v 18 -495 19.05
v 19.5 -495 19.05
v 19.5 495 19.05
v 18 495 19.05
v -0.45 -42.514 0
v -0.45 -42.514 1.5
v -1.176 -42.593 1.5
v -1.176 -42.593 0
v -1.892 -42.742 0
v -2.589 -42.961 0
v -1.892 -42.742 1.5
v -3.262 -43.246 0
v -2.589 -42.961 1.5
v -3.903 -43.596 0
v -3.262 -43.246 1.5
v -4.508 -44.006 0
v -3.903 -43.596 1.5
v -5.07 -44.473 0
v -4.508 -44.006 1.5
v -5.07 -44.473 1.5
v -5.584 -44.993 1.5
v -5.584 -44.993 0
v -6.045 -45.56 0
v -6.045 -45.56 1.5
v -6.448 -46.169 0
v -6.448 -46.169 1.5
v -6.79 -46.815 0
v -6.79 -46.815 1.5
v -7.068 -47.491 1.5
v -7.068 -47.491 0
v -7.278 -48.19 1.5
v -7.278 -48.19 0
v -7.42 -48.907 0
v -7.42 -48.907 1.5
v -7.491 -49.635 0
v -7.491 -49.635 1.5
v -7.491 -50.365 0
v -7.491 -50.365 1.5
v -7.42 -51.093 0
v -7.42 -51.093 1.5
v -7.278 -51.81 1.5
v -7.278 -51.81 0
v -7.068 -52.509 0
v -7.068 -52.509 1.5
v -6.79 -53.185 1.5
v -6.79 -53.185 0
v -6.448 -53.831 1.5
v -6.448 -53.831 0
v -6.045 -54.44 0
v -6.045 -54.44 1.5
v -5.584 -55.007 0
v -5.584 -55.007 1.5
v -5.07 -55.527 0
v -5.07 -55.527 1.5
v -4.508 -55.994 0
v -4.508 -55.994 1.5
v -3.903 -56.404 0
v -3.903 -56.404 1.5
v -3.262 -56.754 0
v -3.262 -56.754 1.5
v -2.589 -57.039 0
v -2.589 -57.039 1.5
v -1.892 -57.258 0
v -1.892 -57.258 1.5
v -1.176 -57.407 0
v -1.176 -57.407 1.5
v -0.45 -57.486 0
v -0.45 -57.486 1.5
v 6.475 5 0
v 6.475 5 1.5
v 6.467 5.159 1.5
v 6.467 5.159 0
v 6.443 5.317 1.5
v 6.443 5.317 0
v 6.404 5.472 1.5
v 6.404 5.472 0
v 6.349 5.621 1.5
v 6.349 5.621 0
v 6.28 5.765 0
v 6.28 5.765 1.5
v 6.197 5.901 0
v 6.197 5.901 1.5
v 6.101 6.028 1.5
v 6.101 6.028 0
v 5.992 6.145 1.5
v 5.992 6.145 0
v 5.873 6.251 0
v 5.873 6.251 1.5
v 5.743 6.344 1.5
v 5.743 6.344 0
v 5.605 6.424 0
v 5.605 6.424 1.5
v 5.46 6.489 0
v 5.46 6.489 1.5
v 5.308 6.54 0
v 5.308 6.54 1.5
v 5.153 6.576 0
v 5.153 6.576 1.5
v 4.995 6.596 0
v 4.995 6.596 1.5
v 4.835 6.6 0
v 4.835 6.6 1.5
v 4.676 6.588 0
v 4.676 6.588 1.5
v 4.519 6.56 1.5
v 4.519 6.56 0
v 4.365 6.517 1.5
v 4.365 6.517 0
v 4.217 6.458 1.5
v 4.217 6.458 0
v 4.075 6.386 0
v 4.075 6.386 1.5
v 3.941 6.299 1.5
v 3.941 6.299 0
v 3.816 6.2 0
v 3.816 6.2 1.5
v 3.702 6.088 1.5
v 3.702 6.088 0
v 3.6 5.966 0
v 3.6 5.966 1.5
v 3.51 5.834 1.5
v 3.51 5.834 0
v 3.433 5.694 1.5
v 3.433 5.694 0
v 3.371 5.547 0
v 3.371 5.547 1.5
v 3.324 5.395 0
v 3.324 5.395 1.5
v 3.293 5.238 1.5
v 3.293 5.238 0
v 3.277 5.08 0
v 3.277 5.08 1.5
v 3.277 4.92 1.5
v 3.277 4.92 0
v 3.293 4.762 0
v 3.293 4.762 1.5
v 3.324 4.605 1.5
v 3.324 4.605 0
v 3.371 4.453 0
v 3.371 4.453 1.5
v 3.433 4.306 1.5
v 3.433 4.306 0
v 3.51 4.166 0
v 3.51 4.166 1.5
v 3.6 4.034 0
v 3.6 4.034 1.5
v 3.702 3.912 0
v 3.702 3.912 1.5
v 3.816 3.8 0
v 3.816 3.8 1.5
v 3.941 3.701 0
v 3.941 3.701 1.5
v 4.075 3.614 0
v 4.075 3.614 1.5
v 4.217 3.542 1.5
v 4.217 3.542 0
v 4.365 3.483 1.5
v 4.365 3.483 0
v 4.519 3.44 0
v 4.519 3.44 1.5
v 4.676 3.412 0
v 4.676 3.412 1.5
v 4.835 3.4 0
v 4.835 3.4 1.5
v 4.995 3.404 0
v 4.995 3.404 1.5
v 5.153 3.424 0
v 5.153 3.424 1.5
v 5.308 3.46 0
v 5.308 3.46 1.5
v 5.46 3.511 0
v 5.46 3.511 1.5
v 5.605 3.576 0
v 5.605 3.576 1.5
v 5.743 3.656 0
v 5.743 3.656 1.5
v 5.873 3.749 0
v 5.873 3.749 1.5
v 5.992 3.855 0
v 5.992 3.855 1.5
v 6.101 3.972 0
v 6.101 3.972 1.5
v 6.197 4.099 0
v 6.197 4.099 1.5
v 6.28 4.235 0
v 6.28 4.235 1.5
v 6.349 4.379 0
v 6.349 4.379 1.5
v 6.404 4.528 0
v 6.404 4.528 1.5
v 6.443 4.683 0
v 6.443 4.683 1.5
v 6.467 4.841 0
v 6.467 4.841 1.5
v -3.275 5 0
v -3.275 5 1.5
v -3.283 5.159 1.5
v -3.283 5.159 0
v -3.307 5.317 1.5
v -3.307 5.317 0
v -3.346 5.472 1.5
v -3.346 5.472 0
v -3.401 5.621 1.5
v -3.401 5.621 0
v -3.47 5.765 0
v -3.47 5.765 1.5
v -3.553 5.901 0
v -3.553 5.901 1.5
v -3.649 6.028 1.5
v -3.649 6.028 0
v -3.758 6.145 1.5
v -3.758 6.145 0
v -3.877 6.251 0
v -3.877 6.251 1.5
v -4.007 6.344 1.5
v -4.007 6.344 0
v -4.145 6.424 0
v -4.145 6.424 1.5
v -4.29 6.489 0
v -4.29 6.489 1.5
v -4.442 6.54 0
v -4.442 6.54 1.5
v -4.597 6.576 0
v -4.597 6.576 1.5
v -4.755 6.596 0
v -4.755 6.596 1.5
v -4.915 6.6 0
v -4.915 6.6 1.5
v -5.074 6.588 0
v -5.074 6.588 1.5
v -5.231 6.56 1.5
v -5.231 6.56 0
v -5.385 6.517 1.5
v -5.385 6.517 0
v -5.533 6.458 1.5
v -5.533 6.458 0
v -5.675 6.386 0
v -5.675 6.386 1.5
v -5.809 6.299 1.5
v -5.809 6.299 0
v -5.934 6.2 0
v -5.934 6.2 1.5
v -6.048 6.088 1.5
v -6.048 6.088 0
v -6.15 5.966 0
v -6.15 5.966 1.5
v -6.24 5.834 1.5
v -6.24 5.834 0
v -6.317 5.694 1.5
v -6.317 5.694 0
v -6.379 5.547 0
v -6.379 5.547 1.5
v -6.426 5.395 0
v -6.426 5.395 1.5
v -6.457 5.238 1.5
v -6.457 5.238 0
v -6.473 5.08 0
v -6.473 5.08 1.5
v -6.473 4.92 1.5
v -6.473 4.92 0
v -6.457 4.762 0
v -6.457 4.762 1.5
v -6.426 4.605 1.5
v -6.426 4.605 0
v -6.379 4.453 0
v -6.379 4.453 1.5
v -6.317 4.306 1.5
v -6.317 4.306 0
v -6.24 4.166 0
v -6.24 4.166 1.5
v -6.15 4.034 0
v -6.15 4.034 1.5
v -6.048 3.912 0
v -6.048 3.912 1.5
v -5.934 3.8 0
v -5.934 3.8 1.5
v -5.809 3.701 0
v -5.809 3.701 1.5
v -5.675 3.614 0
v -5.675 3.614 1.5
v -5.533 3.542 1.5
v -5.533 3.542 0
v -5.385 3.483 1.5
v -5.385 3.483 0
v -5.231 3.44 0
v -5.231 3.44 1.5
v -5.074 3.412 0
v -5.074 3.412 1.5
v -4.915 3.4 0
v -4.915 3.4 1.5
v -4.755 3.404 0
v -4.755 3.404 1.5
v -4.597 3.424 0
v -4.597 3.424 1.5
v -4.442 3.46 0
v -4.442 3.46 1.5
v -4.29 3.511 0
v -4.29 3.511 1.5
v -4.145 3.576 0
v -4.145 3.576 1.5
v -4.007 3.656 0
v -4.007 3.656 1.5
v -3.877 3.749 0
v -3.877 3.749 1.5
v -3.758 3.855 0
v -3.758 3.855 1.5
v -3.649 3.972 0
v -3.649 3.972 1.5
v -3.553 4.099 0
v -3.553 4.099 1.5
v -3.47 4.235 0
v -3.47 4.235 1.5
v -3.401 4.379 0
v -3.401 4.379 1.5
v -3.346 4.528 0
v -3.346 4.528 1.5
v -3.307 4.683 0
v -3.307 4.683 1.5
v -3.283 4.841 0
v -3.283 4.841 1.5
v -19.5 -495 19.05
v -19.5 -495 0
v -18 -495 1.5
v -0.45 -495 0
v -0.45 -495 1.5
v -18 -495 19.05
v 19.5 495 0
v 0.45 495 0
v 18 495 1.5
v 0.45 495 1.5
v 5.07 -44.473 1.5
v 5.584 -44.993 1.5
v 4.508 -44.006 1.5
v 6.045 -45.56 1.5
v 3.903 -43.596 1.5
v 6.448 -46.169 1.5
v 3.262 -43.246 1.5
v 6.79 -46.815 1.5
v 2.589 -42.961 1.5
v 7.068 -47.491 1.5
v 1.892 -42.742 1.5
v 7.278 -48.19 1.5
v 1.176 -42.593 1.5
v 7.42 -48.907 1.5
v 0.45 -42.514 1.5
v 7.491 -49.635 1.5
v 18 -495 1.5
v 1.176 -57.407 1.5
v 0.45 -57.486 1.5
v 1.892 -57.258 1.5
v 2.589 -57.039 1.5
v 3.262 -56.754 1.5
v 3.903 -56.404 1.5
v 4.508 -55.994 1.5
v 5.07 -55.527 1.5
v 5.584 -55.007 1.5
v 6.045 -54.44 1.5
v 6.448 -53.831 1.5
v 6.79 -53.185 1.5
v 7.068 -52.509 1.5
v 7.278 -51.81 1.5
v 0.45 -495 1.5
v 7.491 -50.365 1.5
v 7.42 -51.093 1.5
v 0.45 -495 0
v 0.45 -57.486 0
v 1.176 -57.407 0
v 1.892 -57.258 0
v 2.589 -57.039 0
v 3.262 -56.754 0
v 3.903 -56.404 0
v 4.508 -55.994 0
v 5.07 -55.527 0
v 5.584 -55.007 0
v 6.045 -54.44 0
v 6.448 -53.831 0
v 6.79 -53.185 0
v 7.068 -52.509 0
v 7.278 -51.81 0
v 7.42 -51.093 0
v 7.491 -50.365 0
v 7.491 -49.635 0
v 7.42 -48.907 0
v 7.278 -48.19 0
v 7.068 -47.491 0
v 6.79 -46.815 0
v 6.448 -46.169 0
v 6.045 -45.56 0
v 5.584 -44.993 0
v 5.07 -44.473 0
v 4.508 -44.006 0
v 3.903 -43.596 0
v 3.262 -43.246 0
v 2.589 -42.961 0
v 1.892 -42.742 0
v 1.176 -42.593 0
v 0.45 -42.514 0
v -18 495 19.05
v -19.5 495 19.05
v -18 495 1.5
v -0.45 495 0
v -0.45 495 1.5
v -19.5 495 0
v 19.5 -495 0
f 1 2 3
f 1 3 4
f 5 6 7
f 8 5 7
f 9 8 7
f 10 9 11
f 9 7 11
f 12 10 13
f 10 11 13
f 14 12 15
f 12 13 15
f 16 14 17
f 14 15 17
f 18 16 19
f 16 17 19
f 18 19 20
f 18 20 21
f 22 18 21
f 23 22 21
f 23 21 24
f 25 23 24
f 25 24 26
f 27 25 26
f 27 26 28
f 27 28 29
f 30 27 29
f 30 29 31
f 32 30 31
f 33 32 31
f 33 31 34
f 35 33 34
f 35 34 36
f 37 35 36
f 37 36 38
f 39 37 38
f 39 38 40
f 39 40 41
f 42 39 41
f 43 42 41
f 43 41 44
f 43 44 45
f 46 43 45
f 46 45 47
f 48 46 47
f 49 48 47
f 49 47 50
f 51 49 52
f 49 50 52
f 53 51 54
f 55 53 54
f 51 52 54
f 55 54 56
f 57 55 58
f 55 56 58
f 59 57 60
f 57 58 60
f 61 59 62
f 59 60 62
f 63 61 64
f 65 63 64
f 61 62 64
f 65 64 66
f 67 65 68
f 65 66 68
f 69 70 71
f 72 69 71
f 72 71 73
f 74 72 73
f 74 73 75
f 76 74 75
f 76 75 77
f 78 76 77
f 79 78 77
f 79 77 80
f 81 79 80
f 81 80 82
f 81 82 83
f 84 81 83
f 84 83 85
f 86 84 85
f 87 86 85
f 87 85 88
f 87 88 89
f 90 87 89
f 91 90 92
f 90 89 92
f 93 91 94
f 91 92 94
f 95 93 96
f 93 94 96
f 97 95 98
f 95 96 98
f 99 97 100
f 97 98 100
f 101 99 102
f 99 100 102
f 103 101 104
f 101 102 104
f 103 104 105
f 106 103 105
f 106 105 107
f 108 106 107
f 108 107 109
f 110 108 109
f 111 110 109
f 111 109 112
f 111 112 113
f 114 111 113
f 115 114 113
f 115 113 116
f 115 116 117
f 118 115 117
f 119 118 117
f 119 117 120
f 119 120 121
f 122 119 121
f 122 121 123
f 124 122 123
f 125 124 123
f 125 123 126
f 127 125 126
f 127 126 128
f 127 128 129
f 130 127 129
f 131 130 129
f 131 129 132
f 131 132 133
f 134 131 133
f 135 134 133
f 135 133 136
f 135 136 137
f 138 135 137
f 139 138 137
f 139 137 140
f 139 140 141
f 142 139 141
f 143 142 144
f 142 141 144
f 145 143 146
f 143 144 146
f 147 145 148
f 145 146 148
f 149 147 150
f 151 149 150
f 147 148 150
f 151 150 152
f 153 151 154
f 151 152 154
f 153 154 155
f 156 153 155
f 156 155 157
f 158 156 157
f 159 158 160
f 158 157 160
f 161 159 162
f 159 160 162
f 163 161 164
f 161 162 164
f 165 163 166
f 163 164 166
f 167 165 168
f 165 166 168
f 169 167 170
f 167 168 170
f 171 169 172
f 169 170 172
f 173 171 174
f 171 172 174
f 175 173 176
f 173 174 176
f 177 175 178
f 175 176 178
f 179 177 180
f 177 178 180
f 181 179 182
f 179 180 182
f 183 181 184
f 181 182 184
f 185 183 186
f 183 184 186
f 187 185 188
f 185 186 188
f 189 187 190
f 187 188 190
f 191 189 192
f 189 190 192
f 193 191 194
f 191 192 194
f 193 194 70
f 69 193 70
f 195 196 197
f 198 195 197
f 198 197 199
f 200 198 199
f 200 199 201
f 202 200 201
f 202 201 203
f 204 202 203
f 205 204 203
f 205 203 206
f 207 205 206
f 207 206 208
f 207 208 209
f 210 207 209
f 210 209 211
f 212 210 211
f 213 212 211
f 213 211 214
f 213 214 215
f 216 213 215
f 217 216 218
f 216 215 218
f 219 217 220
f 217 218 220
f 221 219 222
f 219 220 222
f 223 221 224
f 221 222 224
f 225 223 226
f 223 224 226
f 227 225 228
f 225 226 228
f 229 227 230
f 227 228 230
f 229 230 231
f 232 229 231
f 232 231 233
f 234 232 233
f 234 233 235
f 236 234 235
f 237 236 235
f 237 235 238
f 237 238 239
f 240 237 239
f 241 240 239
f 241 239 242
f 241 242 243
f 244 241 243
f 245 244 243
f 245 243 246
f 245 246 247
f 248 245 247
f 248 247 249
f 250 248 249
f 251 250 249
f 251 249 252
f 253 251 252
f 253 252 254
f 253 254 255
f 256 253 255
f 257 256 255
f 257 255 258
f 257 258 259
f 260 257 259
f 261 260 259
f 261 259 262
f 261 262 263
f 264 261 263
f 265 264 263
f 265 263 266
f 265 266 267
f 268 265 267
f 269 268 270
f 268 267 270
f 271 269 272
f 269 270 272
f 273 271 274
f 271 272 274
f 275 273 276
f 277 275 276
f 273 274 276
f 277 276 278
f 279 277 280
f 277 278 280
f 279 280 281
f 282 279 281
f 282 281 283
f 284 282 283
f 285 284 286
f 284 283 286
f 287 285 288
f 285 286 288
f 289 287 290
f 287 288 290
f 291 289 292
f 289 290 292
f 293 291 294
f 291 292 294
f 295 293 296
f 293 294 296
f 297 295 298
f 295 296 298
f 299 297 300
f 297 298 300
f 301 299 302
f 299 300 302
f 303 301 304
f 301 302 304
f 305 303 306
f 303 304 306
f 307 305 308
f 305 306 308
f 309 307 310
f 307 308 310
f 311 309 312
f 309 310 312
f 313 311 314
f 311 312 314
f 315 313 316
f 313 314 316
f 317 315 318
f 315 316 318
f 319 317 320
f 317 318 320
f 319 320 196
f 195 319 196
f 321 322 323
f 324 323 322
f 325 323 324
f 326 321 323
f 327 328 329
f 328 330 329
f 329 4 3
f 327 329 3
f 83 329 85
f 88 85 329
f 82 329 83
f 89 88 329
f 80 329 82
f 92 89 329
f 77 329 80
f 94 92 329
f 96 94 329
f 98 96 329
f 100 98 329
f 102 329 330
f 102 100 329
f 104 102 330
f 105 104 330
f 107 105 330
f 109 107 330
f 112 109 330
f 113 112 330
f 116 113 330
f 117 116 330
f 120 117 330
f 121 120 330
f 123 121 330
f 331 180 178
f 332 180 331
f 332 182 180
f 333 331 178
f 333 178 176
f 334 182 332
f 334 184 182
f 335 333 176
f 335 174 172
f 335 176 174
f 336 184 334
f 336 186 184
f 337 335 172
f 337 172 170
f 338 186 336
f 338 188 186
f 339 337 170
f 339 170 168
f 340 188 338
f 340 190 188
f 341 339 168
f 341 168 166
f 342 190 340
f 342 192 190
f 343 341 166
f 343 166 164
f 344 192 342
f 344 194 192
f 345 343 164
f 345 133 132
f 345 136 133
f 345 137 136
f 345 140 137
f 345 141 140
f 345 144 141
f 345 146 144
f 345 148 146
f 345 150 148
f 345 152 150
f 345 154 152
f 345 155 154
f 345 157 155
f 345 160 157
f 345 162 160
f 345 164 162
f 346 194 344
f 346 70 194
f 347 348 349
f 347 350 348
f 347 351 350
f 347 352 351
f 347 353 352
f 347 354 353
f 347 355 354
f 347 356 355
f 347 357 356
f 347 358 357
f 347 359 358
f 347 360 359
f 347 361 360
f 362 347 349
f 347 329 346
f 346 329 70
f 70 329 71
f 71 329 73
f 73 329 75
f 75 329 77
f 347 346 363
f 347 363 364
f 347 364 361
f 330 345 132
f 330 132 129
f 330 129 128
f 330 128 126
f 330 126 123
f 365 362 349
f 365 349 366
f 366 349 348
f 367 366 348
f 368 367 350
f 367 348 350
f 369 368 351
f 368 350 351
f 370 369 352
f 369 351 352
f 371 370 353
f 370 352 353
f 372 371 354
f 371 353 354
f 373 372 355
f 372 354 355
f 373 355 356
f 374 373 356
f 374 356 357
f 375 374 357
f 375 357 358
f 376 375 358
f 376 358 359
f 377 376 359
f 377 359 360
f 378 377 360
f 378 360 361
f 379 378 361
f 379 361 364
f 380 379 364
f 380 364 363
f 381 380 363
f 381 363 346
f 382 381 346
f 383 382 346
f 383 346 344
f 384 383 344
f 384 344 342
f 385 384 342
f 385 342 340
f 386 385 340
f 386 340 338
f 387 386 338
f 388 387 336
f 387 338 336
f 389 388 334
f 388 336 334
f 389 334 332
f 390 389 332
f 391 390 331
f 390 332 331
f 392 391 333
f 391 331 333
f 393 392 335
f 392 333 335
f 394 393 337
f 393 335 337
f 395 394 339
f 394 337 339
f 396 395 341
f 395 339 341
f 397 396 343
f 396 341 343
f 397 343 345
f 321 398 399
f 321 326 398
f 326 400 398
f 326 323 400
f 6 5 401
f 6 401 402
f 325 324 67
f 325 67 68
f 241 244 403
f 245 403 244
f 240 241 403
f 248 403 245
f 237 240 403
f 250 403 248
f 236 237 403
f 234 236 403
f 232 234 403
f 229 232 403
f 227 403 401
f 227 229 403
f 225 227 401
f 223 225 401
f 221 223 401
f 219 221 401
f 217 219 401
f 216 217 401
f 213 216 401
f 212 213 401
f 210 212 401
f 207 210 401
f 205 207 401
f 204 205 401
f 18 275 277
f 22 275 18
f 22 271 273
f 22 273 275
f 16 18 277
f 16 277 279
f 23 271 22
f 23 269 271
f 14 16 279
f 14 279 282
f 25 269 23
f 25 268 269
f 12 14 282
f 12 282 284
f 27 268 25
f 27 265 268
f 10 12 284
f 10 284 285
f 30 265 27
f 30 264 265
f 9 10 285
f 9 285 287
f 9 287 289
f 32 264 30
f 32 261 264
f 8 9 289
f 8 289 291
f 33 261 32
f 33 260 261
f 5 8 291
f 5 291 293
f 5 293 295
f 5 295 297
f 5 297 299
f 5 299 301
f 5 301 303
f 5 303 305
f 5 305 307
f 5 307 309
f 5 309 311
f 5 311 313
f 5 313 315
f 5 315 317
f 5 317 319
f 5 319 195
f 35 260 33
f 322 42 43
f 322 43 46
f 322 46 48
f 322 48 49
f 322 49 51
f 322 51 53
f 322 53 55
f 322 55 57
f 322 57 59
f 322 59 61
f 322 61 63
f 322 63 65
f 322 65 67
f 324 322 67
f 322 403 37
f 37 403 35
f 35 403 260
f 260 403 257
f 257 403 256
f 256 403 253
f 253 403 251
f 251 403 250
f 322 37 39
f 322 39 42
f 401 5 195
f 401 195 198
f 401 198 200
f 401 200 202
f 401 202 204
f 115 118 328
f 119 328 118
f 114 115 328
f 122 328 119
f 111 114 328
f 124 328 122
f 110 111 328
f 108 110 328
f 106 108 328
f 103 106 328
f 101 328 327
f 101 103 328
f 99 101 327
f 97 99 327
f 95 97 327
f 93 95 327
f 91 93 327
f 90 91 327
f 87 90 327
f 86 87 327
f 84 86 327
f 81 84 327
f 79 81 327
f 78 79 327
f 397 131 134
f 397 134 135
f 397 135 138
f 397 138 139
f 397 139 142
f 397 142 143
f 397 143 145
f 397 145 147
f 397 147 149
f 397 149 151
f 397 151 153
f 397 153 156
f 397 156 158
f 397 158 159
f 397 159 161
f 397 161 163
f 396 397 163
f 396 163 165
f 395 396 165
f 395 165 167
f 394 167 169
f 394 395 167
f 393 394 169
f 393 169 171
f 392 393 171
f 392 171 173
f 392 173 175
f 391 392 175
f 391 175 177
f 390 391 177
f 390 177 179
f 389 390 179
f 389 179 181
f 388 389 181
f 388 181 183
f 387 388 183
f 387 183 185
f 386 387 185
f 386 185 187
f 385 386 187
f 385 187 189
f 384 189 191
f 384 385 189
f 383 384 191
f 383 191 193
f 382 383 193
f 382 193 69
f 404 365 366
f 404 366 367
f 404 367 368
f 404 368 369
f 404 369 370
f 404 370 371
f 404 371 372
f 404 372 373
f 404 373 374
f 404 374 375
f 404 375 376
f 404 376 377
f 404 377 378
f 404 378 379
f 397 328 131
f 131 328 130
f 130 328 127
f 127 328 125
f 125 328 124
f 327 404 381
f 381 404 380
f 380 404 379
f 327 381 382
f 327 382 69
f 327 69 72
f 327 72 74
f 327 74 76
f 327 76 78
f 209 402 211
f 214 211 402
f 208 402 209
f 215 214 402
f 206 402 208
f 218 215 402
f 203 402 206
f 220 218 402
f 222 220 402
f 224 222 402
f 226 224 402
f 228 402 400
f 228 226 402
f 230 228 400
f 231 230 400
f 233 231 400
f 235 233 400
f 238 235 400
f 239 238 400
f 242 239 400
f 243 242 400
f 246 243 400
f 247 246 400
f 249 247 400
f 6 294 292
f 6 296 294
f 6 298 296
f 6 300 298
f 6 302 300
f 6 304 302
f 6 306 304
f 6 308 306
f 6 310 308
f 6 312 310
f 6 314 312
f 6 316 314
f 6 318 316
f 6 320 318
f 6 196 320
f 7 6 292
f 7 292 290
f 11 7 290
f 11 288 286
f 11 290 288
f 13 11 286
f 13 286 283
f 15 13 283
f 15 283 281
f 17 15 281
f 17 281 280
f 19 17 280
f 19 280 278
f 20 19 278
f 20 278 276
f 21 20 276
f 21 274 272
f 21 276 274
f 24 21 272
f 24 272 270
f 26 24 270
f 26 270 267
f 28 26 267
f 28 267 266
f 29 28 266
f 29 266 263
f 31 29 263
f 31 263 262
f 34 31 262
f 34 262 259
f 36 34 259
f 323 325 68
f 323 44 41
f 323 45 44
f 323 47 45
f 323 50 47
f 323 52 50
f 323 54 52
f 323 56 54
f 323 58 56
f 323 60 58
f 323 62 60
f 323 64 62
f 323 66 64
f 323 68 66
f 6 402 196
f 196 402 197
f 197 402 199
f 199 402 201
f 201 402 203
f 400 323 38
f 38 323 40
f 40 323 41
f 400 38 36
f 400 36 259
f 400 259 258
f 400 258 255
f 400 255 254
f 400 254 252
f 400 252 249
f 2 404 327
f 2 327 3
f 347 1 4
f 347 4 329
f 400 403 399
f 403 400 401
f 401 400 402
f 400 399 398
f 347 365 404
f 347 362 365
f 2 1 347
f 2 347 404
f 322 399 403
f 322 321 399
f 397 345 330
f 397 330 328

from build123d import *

# Parameters (mm, degrees)
F1_DEPTH = 495
F2_R     = 1.6
F3_DEPTH = 1.501
F4_R     = 7.5
F5_DEPTH = 1.501


with BuildPart() as f1:
    # F0 (on Front) → F1 (new body, symmetric)
    with BuildSketch(Plane.XZ):
        Polygon((-19.5, 19.05), (-19.5, 0), (-0.45, 0), (-0.45, 1.5), (-18, 1.5), (-18, 19.05), align=None)
    extrude(amount=F1_DEPTH, both=True)


with BuildPart() as f1b:
    # F0 (on Front) → F1, piece 2 (new body, symmetric)
    with BuildSketch(Plane.XZ):
        Polygon((0.45, 0), (19.5, 0), (19.5, 19.05), (18, 19.05), (18, 1.5), (0.45, 1.5), align=None)
    extrude(amount=F1_DEPTH, both=True)


with BuildPart() as f3_tool:
    # F2 (on face) → F3 (new body, through all)
    with BuildSketch(Plane.XY.offset(1.5)):
        with Locations((-4.875, 5)):
            Circle(F2_R)
        with Locations((4.875, 5)):
            Circle(F2_R)
    extrude(amount=-F3_DEPTH)


with BuildPart() as f1_1:
    add(f1.part)

    # F3: cut by f3_tool
    add(f3_tool.part, mode=Mode.SUBTRACT)


with BuildPart() as f1b_1:
    add(f1b.part)

    # F3: cut by f3_tool
    add(f3_tool.part, mode=Mode.SUBTRACT)


with BuildPart() as f5_tool:
    # F4 (on face) → F5 (new body, through all)
    with BuildSketch(Plane.XY.offset(1.5)):
        with Locations((0, -50)):
            Circle(F4_R)
    extrude(amount=-F5_DEPTH)


with BuildPart() as f1_2:
    add(f1_1.part)

    # F5: cut by f5_tool
    add(f5_tool.part, mode=Mode.SUBTRACT)


with BuildPart() as f1b_2:
    add(f1b_1.part)

    # F5: cut by f5_tool
    add(f5_tool.part, mode=Mode.SUBTRACT)


solid = Compound([f1_2.part, f1b_2.part])
